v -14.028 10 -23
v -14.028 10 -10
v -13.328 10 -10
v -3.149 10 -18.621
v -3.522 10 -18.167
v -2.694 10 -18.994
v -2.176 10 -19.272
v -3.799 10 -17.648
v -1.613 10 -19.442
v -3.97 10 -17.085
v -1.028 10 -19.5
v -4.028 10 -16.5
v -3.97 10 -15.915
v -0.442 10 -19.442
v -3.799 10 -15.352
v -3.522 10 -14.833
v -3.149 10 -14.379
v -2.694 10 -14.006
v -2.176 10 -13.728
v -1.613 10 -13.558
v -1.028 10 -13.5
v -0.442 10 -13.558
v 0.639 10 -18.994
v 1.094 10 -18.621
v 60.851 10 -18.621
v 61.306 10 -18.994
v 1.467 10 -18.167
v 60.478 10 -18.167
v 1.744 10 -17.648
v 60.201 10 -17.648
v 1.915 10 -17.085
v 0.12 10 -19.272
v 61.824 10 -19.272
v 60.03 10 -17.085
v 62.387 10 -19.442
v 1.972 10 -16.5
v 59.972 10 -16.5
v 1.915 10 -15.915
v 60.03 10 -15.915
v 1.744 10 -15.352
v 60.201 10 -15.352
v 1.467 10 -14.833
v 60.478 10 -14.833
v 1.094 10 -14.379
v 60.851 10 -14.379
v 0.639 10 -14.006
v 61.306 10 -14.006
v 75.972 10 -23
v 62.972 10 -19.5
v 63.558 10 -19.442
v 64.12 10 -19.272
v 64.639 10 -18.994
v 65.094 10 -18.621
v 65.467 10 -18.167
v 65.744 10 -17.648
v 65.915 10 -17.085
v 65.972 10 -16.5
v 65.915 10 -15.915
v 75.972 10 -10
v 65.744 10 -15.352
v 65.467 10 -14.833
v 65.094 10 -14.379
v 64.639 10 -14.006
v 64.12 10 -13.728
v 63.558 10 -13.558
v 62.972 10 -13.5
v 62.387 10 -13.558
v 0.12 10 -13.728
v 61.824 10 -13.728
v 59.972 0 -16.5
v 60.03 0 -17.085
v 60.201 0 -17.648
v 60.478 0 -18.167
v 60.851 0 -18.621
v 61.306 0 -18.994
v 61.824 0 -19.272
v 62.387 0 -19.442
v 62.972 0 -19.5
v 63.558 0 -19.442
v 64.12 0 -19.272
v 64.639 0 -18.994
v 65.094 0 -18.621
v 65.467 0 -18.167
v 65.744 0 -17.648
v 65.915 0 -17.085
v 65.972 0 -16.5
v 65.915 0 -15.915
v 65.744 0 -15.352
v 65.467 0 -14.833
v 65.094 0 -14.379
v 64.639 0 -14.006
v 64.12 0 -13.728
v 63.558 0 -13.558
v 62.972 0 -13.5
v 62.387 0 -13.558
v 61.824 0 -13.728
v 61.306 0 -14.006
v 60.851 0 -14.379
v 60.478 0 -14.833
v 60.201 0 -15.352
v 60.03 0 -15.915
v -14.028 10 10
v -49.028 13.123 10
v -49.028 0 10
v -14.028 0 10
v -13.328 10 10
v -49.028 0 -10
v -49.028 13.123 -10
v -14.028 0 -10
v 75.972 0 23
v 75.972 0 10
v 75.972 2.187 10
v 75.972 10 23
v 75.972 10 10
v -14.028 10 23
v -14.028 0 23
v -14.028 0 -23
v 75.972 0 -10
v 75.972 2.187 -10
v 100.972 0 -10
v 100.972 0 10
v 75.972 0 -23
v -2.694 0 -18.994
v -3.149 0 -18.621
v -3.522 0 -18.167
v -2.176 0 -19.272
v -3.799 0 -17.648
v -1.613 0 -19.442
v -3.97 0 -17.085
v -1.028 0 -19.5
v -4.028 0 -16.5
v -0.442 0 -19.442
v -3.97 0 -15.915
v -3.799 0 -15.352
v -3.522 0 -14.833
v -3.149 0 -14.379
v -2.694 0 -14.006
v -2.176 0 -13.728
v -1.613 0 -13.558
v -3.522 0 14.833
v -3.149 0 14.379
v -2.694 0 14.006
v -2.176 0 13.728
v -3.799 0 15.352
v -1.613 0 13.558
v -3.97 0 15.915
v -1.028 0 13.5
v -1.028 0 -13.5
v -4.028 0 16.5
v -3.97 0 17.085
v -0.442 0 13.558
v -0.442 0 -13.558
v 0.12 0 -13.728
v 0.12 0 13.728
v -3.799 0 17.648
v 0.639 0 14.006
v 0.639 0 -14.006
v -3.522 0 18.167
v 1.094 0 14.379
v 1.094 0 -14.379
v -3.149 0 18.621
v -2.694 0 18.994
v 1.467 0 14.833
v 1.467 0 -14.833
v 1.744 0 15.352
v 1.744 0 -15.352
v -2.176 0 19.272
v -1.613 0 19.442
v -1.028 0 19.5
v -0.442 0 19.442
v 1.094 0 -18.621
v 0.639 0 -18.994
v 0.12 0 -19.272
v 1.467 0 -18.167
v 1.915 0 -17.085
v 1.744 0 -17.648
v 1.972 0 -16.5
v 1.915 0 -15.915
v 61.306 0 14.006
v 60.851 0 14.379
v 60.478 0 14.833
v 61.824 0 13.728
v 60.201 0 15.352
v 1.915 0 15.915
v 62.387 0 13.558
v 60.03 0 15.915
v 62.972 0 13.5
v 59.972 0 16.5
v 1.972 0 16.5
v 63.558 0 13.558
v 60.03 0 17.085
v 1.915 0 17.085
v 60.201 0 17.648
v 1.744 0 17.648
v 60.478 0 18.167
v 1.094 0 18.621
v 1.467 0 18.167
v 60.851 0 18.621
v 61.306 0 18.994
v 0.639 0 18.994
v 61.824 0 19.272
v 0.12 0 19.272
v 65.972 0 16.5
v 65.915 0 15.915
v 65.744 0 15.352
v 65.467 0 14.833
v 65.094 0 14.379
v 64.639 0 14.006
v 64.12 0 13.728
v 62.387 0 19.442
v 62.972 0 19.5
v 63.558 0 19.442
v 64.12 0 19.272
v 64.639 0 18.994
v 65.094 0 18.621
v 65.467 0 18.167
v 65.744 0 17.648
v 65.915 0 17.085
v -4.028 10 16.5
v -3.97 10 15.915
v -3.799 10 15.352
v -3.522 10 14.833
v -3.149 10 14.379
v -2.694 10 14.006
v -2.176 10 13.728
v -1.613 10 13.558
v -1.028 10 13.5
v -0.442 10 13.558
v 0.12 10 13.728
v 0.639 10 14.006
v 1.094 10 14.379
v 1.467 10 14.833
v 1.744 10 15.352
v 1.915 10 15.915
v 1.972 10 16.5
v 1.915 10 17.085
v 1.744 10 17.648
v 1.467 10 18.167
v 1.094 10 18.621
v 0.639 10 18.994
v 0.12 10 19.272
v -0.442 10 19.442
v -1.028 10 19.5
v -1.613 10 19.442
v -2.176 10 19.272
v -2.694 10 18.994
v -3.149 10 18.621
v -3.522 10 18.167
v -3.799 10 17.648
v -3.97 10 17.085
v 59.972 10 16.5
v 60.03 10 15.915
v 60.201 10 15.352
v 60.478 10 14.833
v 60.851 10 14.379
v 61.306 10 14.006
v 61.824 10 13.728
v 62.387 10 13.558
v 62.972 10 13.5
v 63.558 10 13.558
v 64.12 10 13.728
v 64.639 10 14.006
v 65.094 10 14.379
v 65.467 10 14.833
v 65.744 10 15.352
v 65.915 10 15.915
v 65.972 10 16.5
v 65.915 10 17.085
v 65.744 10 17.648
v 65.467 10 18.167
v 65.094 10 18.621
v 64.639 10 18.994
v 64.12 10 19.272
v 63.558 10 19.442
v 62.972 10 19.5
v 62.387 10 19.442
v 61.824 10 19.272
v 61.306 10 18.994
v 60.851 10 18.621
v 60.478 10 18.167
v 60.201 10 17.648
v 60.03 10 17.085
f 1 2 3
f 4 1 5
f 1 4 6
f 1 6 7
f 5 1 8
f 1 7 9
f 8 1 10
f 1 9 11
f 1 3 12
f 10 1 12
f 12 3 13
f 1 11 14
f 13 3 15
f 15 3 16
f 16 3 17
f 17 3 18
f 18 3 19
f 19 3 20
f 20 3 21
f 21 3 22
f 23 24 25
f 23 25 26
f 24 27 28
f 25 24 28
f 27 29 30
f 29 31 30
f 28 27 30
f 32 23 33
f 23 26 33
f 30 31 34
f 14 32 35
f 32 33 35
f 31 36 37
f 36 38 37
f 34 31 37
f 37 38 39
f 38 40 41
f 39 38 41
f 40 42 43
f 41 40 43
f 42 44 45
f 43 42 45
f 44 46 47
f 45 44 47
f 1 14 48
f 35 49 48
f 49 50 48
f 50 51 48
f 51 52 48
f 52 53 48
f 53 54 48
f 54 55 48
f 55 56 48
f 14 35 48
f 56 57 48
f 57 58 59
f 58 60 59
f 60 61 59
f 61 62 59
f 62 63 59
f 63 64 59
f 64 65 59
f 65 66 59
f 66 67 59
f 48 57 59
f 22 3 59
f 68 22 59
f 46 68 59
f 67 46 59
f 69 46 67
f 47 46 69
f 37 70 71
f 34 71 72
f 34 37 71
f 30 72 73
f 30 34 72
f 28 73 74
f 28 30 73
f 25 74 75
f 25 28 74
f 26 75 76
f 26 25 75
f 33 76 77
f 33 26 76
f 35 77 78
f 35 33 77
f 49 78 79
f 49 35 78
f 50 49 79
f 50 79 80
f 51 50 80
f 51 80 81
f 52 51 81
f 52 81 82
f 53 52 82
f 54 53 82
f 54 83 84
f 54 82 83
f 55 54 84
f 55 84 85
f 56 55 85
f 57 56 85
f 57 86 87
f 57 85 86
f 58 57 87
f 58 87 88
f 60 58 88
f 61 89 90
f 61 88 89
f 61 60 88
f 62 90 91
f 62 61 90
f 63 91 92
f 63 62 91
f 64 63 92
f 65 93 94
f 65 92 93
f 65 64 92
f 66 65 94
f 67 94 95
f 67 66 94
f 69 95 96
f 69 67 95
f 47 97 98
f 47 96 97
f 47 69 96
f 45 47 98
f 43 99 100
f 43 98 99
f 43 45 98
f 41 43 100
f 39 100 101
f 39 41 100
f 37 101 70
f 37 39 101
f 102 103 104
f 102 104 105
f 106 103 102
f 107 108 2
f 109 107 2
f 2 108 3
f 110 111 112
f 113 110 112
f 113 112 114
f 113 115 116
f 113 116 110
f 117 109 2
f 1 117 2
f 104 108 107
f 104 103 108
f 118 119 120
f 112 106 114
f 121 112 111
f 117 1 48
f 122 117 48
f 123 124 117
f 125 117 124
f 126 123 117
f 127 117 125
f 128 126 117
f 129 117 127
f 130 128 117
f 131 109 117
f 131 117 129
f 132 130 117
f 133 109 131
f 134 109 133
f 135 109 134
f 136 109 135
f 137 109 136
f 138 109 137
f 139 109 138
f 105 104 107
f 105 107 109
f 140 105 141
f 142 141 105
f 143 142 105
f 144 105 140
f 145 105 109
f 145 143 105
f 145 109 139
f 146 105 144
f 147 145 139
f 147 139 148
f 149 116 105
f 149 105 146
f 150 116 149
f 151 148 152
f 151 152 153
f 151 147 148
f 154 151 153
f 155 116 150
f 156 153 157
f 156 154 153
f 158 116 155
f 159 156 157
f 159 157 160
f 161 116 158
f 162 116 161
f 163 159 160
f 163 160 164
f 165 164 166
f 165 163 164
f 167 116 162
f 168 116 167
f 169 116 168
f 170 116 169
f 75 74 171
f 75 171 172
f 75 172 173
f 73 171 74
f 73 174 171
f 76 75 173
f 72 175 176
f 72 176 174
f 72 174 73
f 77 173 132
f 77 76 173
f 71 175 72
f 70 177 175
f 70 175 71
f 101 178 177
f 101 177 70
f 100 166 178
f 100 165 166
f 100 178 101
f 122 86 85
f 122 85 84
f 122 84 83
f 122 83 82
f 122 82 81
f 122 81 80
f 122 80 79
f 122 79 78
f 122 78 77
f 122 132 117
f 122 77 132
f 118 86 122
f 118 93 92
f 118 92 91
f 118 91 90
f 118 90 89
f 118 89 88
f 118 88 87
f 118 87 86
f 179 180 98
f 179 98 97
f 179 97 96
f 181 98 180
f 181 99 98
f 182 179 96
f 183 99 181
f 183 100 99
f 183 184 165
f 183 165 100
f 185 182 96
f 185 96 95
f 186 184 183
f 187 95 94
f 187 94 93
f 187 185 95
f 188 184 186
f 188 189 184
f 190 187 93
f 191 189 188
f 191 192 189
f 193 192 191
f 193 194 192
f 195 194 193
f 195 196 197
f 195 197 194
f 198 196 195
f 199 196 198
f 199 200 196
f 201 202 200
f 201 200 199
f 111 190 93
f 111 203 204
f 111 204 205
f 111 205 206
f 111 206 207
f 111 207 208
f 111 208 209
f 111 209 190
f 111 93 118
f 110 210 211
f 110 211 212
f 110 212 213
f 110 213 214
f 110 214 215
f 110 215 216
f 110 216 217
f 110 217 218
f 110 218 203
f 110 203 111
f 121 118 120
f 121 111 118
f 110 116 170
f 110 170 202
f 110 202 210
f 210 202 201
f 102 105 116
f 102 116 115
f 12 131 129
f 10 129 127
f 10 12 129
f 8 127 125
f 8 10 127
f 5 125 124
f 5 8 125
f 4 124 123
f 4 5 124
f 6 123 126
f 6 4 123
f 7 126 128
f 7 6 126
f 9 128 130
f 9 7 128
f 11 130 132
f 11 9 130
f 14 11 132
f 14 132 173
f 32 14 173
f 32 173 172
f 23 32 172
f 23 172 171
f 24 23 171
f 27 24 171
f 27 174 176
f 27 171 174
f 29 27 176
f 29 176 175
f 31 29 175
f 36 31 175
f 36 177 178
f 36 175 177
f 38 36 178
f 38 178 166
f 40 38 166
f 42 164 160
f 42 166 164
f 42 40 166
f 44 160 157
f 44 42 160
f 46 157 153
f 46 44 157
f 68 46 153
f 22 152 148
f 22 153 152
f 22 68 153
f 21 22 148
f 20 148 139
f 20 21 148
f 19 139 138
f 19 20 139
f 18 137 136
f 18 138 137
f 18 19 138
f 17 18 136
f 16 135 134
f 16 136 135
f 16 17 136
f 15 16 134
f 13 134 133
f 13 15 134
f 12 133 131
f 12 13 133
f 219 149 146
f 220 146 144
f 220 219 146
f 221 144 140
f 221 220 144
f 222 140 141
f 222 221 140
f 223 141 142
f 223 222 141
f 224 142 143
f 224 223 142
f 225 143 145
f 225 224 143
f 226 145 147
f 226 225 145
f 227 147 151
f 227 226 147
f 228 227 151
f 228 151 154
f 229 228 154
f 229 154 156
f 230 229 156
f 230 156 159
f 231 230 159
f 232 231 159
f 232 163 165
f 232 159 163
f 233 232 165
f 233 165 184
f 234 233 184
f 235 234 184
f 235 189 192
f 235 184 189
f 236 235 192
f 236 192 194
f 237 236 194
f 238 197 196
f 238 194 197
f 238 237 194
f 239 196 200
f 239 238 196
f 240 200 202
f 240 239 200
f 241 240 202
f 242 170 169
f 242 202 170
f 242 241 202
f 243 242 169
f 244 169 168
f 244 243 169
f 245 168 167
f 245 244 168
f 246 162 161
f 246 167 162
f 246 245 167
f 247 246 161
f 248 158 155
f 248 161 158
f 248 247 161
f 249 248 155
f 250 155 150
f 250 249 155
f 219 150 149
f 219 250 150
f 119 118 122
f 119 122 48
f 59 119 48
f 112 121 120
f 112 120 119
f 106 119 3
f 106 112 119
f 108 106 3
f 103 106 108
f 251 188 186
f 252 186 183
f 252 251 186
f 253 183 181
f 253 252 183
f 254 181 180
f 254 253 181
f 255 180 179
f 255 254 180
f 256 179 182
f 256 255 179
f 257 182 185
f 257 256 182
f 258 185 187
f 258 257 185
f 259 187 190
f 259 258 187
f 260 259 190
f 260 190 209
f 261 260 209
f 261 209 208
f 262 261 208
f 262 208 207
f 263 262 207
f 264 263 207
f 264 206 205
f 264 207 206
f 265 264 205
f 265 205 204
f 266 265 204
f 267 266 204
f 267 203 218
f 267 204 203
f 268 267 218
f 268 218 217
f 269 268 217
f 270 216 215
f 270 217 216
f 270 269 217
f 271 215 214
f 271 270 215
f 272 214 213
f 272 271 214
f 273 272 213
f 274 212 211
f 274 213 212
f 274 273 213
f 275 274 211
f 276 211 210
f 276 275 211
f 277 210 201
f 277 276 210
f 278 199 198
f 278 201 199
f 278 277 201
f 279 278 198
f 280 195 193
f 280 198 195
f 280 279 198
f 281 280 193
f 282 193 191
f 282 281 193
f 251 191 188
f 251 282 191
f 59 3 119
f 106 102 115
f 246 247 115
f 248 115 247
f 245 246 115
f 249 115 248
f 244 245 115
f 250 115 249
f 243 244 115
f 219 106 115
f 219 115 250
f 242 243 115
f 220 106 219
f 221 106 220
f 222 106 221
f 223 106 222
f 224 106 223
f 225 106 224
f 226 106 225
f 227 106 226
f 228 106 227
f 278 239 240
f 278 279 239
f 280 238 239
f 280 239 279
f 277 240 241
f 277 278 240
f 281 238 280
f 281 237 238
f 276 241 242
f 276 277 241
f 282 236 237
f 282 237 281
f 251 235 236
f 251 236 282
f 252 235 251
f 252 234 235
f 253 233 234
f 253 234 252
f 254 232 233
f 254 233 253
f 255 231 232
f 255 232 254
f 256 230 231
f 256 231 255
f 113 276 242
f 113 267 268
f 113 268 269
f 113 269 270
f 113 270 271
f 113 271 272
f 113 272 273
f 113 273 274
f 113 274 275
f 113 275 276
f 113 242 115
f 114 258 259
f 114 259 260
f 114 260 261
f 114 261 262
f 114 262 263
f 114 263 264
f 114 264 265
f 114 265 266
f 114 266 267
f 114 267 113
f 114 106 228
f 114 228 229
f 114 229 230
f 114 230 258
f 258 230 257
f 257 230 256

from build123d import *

# Parameters (mm, degrees)
BOSS_EXTRUDE1_DEPTH = 10
SKETCH2_W           = 90
SKETCH2_H           = 10
BOSS_EXTRUDE2_DEPTH = 13
SKETCH3_W           = 90
SKETCH3_H           = 10
BOSS_EXTRUDE3_DEPTH = 13
SKETCH4_R           = 3
CUT_EXTRUDE2_DEPTH  = 13


with BuildPart() as part:
    # Sketch1 → Boss-Extrude1 (new, symmetric)
    with BuildSketch(Plane.XY):
        Polygon((-49.027757444, 0), (100.972242556, 0), (-49.027757444, 13.123299529), align=None)
    extrude(amount=BOSS_EXTRUDE1_DEPTH, both=True)

    # Sketch2 → Boss-Extrude2 (add)
    with BuildSketch(Plane.XY.offset(10)):
        with Locations((30.972242556, 5)):
            Rectangle(SKETCH2_W, SKETCH2_H)
    extrude(amount=BOSS_EXTRUDE2_DEPTH)

    # Sketch3 → Boss-Extrude3 (add)
    with BuildSketch(Plane.XY.offset(-10)):
        with Locations((30.972242556, 5)):
            Rectangle(SKETCH3_W, SKETCH3_H)
    extrude(amount=-BOSS_EXTRUDE3_DEPTH)

    # Sketch4 → Cut-Extrude2 (cut)
    with BuildSketch(Plane.XZ.offset(-10)):
        with Locations(Location((-1.027757444, 16.5, 0), (0, 0, 180))):
            Circle(SKETCH4_R)
        with Locations(Location((62.972242556, 16.5, 0), (0, 0, 180))):
            Circle(SKETCH4_R)
        with Locations(Location((62.972242556, -16.5, 0), (0, 0, 180))):
            Circle(SKETCH4_R)
        with Locations(Location((-1.027757444, -16.5, 0), (0, 0, 180))):
            Circle(SKETCH4_R)
    extrude(amount=CUT_EXTRUDE2_DEPTH, mode=Mode.SUBTRACT)


solid = part.part
